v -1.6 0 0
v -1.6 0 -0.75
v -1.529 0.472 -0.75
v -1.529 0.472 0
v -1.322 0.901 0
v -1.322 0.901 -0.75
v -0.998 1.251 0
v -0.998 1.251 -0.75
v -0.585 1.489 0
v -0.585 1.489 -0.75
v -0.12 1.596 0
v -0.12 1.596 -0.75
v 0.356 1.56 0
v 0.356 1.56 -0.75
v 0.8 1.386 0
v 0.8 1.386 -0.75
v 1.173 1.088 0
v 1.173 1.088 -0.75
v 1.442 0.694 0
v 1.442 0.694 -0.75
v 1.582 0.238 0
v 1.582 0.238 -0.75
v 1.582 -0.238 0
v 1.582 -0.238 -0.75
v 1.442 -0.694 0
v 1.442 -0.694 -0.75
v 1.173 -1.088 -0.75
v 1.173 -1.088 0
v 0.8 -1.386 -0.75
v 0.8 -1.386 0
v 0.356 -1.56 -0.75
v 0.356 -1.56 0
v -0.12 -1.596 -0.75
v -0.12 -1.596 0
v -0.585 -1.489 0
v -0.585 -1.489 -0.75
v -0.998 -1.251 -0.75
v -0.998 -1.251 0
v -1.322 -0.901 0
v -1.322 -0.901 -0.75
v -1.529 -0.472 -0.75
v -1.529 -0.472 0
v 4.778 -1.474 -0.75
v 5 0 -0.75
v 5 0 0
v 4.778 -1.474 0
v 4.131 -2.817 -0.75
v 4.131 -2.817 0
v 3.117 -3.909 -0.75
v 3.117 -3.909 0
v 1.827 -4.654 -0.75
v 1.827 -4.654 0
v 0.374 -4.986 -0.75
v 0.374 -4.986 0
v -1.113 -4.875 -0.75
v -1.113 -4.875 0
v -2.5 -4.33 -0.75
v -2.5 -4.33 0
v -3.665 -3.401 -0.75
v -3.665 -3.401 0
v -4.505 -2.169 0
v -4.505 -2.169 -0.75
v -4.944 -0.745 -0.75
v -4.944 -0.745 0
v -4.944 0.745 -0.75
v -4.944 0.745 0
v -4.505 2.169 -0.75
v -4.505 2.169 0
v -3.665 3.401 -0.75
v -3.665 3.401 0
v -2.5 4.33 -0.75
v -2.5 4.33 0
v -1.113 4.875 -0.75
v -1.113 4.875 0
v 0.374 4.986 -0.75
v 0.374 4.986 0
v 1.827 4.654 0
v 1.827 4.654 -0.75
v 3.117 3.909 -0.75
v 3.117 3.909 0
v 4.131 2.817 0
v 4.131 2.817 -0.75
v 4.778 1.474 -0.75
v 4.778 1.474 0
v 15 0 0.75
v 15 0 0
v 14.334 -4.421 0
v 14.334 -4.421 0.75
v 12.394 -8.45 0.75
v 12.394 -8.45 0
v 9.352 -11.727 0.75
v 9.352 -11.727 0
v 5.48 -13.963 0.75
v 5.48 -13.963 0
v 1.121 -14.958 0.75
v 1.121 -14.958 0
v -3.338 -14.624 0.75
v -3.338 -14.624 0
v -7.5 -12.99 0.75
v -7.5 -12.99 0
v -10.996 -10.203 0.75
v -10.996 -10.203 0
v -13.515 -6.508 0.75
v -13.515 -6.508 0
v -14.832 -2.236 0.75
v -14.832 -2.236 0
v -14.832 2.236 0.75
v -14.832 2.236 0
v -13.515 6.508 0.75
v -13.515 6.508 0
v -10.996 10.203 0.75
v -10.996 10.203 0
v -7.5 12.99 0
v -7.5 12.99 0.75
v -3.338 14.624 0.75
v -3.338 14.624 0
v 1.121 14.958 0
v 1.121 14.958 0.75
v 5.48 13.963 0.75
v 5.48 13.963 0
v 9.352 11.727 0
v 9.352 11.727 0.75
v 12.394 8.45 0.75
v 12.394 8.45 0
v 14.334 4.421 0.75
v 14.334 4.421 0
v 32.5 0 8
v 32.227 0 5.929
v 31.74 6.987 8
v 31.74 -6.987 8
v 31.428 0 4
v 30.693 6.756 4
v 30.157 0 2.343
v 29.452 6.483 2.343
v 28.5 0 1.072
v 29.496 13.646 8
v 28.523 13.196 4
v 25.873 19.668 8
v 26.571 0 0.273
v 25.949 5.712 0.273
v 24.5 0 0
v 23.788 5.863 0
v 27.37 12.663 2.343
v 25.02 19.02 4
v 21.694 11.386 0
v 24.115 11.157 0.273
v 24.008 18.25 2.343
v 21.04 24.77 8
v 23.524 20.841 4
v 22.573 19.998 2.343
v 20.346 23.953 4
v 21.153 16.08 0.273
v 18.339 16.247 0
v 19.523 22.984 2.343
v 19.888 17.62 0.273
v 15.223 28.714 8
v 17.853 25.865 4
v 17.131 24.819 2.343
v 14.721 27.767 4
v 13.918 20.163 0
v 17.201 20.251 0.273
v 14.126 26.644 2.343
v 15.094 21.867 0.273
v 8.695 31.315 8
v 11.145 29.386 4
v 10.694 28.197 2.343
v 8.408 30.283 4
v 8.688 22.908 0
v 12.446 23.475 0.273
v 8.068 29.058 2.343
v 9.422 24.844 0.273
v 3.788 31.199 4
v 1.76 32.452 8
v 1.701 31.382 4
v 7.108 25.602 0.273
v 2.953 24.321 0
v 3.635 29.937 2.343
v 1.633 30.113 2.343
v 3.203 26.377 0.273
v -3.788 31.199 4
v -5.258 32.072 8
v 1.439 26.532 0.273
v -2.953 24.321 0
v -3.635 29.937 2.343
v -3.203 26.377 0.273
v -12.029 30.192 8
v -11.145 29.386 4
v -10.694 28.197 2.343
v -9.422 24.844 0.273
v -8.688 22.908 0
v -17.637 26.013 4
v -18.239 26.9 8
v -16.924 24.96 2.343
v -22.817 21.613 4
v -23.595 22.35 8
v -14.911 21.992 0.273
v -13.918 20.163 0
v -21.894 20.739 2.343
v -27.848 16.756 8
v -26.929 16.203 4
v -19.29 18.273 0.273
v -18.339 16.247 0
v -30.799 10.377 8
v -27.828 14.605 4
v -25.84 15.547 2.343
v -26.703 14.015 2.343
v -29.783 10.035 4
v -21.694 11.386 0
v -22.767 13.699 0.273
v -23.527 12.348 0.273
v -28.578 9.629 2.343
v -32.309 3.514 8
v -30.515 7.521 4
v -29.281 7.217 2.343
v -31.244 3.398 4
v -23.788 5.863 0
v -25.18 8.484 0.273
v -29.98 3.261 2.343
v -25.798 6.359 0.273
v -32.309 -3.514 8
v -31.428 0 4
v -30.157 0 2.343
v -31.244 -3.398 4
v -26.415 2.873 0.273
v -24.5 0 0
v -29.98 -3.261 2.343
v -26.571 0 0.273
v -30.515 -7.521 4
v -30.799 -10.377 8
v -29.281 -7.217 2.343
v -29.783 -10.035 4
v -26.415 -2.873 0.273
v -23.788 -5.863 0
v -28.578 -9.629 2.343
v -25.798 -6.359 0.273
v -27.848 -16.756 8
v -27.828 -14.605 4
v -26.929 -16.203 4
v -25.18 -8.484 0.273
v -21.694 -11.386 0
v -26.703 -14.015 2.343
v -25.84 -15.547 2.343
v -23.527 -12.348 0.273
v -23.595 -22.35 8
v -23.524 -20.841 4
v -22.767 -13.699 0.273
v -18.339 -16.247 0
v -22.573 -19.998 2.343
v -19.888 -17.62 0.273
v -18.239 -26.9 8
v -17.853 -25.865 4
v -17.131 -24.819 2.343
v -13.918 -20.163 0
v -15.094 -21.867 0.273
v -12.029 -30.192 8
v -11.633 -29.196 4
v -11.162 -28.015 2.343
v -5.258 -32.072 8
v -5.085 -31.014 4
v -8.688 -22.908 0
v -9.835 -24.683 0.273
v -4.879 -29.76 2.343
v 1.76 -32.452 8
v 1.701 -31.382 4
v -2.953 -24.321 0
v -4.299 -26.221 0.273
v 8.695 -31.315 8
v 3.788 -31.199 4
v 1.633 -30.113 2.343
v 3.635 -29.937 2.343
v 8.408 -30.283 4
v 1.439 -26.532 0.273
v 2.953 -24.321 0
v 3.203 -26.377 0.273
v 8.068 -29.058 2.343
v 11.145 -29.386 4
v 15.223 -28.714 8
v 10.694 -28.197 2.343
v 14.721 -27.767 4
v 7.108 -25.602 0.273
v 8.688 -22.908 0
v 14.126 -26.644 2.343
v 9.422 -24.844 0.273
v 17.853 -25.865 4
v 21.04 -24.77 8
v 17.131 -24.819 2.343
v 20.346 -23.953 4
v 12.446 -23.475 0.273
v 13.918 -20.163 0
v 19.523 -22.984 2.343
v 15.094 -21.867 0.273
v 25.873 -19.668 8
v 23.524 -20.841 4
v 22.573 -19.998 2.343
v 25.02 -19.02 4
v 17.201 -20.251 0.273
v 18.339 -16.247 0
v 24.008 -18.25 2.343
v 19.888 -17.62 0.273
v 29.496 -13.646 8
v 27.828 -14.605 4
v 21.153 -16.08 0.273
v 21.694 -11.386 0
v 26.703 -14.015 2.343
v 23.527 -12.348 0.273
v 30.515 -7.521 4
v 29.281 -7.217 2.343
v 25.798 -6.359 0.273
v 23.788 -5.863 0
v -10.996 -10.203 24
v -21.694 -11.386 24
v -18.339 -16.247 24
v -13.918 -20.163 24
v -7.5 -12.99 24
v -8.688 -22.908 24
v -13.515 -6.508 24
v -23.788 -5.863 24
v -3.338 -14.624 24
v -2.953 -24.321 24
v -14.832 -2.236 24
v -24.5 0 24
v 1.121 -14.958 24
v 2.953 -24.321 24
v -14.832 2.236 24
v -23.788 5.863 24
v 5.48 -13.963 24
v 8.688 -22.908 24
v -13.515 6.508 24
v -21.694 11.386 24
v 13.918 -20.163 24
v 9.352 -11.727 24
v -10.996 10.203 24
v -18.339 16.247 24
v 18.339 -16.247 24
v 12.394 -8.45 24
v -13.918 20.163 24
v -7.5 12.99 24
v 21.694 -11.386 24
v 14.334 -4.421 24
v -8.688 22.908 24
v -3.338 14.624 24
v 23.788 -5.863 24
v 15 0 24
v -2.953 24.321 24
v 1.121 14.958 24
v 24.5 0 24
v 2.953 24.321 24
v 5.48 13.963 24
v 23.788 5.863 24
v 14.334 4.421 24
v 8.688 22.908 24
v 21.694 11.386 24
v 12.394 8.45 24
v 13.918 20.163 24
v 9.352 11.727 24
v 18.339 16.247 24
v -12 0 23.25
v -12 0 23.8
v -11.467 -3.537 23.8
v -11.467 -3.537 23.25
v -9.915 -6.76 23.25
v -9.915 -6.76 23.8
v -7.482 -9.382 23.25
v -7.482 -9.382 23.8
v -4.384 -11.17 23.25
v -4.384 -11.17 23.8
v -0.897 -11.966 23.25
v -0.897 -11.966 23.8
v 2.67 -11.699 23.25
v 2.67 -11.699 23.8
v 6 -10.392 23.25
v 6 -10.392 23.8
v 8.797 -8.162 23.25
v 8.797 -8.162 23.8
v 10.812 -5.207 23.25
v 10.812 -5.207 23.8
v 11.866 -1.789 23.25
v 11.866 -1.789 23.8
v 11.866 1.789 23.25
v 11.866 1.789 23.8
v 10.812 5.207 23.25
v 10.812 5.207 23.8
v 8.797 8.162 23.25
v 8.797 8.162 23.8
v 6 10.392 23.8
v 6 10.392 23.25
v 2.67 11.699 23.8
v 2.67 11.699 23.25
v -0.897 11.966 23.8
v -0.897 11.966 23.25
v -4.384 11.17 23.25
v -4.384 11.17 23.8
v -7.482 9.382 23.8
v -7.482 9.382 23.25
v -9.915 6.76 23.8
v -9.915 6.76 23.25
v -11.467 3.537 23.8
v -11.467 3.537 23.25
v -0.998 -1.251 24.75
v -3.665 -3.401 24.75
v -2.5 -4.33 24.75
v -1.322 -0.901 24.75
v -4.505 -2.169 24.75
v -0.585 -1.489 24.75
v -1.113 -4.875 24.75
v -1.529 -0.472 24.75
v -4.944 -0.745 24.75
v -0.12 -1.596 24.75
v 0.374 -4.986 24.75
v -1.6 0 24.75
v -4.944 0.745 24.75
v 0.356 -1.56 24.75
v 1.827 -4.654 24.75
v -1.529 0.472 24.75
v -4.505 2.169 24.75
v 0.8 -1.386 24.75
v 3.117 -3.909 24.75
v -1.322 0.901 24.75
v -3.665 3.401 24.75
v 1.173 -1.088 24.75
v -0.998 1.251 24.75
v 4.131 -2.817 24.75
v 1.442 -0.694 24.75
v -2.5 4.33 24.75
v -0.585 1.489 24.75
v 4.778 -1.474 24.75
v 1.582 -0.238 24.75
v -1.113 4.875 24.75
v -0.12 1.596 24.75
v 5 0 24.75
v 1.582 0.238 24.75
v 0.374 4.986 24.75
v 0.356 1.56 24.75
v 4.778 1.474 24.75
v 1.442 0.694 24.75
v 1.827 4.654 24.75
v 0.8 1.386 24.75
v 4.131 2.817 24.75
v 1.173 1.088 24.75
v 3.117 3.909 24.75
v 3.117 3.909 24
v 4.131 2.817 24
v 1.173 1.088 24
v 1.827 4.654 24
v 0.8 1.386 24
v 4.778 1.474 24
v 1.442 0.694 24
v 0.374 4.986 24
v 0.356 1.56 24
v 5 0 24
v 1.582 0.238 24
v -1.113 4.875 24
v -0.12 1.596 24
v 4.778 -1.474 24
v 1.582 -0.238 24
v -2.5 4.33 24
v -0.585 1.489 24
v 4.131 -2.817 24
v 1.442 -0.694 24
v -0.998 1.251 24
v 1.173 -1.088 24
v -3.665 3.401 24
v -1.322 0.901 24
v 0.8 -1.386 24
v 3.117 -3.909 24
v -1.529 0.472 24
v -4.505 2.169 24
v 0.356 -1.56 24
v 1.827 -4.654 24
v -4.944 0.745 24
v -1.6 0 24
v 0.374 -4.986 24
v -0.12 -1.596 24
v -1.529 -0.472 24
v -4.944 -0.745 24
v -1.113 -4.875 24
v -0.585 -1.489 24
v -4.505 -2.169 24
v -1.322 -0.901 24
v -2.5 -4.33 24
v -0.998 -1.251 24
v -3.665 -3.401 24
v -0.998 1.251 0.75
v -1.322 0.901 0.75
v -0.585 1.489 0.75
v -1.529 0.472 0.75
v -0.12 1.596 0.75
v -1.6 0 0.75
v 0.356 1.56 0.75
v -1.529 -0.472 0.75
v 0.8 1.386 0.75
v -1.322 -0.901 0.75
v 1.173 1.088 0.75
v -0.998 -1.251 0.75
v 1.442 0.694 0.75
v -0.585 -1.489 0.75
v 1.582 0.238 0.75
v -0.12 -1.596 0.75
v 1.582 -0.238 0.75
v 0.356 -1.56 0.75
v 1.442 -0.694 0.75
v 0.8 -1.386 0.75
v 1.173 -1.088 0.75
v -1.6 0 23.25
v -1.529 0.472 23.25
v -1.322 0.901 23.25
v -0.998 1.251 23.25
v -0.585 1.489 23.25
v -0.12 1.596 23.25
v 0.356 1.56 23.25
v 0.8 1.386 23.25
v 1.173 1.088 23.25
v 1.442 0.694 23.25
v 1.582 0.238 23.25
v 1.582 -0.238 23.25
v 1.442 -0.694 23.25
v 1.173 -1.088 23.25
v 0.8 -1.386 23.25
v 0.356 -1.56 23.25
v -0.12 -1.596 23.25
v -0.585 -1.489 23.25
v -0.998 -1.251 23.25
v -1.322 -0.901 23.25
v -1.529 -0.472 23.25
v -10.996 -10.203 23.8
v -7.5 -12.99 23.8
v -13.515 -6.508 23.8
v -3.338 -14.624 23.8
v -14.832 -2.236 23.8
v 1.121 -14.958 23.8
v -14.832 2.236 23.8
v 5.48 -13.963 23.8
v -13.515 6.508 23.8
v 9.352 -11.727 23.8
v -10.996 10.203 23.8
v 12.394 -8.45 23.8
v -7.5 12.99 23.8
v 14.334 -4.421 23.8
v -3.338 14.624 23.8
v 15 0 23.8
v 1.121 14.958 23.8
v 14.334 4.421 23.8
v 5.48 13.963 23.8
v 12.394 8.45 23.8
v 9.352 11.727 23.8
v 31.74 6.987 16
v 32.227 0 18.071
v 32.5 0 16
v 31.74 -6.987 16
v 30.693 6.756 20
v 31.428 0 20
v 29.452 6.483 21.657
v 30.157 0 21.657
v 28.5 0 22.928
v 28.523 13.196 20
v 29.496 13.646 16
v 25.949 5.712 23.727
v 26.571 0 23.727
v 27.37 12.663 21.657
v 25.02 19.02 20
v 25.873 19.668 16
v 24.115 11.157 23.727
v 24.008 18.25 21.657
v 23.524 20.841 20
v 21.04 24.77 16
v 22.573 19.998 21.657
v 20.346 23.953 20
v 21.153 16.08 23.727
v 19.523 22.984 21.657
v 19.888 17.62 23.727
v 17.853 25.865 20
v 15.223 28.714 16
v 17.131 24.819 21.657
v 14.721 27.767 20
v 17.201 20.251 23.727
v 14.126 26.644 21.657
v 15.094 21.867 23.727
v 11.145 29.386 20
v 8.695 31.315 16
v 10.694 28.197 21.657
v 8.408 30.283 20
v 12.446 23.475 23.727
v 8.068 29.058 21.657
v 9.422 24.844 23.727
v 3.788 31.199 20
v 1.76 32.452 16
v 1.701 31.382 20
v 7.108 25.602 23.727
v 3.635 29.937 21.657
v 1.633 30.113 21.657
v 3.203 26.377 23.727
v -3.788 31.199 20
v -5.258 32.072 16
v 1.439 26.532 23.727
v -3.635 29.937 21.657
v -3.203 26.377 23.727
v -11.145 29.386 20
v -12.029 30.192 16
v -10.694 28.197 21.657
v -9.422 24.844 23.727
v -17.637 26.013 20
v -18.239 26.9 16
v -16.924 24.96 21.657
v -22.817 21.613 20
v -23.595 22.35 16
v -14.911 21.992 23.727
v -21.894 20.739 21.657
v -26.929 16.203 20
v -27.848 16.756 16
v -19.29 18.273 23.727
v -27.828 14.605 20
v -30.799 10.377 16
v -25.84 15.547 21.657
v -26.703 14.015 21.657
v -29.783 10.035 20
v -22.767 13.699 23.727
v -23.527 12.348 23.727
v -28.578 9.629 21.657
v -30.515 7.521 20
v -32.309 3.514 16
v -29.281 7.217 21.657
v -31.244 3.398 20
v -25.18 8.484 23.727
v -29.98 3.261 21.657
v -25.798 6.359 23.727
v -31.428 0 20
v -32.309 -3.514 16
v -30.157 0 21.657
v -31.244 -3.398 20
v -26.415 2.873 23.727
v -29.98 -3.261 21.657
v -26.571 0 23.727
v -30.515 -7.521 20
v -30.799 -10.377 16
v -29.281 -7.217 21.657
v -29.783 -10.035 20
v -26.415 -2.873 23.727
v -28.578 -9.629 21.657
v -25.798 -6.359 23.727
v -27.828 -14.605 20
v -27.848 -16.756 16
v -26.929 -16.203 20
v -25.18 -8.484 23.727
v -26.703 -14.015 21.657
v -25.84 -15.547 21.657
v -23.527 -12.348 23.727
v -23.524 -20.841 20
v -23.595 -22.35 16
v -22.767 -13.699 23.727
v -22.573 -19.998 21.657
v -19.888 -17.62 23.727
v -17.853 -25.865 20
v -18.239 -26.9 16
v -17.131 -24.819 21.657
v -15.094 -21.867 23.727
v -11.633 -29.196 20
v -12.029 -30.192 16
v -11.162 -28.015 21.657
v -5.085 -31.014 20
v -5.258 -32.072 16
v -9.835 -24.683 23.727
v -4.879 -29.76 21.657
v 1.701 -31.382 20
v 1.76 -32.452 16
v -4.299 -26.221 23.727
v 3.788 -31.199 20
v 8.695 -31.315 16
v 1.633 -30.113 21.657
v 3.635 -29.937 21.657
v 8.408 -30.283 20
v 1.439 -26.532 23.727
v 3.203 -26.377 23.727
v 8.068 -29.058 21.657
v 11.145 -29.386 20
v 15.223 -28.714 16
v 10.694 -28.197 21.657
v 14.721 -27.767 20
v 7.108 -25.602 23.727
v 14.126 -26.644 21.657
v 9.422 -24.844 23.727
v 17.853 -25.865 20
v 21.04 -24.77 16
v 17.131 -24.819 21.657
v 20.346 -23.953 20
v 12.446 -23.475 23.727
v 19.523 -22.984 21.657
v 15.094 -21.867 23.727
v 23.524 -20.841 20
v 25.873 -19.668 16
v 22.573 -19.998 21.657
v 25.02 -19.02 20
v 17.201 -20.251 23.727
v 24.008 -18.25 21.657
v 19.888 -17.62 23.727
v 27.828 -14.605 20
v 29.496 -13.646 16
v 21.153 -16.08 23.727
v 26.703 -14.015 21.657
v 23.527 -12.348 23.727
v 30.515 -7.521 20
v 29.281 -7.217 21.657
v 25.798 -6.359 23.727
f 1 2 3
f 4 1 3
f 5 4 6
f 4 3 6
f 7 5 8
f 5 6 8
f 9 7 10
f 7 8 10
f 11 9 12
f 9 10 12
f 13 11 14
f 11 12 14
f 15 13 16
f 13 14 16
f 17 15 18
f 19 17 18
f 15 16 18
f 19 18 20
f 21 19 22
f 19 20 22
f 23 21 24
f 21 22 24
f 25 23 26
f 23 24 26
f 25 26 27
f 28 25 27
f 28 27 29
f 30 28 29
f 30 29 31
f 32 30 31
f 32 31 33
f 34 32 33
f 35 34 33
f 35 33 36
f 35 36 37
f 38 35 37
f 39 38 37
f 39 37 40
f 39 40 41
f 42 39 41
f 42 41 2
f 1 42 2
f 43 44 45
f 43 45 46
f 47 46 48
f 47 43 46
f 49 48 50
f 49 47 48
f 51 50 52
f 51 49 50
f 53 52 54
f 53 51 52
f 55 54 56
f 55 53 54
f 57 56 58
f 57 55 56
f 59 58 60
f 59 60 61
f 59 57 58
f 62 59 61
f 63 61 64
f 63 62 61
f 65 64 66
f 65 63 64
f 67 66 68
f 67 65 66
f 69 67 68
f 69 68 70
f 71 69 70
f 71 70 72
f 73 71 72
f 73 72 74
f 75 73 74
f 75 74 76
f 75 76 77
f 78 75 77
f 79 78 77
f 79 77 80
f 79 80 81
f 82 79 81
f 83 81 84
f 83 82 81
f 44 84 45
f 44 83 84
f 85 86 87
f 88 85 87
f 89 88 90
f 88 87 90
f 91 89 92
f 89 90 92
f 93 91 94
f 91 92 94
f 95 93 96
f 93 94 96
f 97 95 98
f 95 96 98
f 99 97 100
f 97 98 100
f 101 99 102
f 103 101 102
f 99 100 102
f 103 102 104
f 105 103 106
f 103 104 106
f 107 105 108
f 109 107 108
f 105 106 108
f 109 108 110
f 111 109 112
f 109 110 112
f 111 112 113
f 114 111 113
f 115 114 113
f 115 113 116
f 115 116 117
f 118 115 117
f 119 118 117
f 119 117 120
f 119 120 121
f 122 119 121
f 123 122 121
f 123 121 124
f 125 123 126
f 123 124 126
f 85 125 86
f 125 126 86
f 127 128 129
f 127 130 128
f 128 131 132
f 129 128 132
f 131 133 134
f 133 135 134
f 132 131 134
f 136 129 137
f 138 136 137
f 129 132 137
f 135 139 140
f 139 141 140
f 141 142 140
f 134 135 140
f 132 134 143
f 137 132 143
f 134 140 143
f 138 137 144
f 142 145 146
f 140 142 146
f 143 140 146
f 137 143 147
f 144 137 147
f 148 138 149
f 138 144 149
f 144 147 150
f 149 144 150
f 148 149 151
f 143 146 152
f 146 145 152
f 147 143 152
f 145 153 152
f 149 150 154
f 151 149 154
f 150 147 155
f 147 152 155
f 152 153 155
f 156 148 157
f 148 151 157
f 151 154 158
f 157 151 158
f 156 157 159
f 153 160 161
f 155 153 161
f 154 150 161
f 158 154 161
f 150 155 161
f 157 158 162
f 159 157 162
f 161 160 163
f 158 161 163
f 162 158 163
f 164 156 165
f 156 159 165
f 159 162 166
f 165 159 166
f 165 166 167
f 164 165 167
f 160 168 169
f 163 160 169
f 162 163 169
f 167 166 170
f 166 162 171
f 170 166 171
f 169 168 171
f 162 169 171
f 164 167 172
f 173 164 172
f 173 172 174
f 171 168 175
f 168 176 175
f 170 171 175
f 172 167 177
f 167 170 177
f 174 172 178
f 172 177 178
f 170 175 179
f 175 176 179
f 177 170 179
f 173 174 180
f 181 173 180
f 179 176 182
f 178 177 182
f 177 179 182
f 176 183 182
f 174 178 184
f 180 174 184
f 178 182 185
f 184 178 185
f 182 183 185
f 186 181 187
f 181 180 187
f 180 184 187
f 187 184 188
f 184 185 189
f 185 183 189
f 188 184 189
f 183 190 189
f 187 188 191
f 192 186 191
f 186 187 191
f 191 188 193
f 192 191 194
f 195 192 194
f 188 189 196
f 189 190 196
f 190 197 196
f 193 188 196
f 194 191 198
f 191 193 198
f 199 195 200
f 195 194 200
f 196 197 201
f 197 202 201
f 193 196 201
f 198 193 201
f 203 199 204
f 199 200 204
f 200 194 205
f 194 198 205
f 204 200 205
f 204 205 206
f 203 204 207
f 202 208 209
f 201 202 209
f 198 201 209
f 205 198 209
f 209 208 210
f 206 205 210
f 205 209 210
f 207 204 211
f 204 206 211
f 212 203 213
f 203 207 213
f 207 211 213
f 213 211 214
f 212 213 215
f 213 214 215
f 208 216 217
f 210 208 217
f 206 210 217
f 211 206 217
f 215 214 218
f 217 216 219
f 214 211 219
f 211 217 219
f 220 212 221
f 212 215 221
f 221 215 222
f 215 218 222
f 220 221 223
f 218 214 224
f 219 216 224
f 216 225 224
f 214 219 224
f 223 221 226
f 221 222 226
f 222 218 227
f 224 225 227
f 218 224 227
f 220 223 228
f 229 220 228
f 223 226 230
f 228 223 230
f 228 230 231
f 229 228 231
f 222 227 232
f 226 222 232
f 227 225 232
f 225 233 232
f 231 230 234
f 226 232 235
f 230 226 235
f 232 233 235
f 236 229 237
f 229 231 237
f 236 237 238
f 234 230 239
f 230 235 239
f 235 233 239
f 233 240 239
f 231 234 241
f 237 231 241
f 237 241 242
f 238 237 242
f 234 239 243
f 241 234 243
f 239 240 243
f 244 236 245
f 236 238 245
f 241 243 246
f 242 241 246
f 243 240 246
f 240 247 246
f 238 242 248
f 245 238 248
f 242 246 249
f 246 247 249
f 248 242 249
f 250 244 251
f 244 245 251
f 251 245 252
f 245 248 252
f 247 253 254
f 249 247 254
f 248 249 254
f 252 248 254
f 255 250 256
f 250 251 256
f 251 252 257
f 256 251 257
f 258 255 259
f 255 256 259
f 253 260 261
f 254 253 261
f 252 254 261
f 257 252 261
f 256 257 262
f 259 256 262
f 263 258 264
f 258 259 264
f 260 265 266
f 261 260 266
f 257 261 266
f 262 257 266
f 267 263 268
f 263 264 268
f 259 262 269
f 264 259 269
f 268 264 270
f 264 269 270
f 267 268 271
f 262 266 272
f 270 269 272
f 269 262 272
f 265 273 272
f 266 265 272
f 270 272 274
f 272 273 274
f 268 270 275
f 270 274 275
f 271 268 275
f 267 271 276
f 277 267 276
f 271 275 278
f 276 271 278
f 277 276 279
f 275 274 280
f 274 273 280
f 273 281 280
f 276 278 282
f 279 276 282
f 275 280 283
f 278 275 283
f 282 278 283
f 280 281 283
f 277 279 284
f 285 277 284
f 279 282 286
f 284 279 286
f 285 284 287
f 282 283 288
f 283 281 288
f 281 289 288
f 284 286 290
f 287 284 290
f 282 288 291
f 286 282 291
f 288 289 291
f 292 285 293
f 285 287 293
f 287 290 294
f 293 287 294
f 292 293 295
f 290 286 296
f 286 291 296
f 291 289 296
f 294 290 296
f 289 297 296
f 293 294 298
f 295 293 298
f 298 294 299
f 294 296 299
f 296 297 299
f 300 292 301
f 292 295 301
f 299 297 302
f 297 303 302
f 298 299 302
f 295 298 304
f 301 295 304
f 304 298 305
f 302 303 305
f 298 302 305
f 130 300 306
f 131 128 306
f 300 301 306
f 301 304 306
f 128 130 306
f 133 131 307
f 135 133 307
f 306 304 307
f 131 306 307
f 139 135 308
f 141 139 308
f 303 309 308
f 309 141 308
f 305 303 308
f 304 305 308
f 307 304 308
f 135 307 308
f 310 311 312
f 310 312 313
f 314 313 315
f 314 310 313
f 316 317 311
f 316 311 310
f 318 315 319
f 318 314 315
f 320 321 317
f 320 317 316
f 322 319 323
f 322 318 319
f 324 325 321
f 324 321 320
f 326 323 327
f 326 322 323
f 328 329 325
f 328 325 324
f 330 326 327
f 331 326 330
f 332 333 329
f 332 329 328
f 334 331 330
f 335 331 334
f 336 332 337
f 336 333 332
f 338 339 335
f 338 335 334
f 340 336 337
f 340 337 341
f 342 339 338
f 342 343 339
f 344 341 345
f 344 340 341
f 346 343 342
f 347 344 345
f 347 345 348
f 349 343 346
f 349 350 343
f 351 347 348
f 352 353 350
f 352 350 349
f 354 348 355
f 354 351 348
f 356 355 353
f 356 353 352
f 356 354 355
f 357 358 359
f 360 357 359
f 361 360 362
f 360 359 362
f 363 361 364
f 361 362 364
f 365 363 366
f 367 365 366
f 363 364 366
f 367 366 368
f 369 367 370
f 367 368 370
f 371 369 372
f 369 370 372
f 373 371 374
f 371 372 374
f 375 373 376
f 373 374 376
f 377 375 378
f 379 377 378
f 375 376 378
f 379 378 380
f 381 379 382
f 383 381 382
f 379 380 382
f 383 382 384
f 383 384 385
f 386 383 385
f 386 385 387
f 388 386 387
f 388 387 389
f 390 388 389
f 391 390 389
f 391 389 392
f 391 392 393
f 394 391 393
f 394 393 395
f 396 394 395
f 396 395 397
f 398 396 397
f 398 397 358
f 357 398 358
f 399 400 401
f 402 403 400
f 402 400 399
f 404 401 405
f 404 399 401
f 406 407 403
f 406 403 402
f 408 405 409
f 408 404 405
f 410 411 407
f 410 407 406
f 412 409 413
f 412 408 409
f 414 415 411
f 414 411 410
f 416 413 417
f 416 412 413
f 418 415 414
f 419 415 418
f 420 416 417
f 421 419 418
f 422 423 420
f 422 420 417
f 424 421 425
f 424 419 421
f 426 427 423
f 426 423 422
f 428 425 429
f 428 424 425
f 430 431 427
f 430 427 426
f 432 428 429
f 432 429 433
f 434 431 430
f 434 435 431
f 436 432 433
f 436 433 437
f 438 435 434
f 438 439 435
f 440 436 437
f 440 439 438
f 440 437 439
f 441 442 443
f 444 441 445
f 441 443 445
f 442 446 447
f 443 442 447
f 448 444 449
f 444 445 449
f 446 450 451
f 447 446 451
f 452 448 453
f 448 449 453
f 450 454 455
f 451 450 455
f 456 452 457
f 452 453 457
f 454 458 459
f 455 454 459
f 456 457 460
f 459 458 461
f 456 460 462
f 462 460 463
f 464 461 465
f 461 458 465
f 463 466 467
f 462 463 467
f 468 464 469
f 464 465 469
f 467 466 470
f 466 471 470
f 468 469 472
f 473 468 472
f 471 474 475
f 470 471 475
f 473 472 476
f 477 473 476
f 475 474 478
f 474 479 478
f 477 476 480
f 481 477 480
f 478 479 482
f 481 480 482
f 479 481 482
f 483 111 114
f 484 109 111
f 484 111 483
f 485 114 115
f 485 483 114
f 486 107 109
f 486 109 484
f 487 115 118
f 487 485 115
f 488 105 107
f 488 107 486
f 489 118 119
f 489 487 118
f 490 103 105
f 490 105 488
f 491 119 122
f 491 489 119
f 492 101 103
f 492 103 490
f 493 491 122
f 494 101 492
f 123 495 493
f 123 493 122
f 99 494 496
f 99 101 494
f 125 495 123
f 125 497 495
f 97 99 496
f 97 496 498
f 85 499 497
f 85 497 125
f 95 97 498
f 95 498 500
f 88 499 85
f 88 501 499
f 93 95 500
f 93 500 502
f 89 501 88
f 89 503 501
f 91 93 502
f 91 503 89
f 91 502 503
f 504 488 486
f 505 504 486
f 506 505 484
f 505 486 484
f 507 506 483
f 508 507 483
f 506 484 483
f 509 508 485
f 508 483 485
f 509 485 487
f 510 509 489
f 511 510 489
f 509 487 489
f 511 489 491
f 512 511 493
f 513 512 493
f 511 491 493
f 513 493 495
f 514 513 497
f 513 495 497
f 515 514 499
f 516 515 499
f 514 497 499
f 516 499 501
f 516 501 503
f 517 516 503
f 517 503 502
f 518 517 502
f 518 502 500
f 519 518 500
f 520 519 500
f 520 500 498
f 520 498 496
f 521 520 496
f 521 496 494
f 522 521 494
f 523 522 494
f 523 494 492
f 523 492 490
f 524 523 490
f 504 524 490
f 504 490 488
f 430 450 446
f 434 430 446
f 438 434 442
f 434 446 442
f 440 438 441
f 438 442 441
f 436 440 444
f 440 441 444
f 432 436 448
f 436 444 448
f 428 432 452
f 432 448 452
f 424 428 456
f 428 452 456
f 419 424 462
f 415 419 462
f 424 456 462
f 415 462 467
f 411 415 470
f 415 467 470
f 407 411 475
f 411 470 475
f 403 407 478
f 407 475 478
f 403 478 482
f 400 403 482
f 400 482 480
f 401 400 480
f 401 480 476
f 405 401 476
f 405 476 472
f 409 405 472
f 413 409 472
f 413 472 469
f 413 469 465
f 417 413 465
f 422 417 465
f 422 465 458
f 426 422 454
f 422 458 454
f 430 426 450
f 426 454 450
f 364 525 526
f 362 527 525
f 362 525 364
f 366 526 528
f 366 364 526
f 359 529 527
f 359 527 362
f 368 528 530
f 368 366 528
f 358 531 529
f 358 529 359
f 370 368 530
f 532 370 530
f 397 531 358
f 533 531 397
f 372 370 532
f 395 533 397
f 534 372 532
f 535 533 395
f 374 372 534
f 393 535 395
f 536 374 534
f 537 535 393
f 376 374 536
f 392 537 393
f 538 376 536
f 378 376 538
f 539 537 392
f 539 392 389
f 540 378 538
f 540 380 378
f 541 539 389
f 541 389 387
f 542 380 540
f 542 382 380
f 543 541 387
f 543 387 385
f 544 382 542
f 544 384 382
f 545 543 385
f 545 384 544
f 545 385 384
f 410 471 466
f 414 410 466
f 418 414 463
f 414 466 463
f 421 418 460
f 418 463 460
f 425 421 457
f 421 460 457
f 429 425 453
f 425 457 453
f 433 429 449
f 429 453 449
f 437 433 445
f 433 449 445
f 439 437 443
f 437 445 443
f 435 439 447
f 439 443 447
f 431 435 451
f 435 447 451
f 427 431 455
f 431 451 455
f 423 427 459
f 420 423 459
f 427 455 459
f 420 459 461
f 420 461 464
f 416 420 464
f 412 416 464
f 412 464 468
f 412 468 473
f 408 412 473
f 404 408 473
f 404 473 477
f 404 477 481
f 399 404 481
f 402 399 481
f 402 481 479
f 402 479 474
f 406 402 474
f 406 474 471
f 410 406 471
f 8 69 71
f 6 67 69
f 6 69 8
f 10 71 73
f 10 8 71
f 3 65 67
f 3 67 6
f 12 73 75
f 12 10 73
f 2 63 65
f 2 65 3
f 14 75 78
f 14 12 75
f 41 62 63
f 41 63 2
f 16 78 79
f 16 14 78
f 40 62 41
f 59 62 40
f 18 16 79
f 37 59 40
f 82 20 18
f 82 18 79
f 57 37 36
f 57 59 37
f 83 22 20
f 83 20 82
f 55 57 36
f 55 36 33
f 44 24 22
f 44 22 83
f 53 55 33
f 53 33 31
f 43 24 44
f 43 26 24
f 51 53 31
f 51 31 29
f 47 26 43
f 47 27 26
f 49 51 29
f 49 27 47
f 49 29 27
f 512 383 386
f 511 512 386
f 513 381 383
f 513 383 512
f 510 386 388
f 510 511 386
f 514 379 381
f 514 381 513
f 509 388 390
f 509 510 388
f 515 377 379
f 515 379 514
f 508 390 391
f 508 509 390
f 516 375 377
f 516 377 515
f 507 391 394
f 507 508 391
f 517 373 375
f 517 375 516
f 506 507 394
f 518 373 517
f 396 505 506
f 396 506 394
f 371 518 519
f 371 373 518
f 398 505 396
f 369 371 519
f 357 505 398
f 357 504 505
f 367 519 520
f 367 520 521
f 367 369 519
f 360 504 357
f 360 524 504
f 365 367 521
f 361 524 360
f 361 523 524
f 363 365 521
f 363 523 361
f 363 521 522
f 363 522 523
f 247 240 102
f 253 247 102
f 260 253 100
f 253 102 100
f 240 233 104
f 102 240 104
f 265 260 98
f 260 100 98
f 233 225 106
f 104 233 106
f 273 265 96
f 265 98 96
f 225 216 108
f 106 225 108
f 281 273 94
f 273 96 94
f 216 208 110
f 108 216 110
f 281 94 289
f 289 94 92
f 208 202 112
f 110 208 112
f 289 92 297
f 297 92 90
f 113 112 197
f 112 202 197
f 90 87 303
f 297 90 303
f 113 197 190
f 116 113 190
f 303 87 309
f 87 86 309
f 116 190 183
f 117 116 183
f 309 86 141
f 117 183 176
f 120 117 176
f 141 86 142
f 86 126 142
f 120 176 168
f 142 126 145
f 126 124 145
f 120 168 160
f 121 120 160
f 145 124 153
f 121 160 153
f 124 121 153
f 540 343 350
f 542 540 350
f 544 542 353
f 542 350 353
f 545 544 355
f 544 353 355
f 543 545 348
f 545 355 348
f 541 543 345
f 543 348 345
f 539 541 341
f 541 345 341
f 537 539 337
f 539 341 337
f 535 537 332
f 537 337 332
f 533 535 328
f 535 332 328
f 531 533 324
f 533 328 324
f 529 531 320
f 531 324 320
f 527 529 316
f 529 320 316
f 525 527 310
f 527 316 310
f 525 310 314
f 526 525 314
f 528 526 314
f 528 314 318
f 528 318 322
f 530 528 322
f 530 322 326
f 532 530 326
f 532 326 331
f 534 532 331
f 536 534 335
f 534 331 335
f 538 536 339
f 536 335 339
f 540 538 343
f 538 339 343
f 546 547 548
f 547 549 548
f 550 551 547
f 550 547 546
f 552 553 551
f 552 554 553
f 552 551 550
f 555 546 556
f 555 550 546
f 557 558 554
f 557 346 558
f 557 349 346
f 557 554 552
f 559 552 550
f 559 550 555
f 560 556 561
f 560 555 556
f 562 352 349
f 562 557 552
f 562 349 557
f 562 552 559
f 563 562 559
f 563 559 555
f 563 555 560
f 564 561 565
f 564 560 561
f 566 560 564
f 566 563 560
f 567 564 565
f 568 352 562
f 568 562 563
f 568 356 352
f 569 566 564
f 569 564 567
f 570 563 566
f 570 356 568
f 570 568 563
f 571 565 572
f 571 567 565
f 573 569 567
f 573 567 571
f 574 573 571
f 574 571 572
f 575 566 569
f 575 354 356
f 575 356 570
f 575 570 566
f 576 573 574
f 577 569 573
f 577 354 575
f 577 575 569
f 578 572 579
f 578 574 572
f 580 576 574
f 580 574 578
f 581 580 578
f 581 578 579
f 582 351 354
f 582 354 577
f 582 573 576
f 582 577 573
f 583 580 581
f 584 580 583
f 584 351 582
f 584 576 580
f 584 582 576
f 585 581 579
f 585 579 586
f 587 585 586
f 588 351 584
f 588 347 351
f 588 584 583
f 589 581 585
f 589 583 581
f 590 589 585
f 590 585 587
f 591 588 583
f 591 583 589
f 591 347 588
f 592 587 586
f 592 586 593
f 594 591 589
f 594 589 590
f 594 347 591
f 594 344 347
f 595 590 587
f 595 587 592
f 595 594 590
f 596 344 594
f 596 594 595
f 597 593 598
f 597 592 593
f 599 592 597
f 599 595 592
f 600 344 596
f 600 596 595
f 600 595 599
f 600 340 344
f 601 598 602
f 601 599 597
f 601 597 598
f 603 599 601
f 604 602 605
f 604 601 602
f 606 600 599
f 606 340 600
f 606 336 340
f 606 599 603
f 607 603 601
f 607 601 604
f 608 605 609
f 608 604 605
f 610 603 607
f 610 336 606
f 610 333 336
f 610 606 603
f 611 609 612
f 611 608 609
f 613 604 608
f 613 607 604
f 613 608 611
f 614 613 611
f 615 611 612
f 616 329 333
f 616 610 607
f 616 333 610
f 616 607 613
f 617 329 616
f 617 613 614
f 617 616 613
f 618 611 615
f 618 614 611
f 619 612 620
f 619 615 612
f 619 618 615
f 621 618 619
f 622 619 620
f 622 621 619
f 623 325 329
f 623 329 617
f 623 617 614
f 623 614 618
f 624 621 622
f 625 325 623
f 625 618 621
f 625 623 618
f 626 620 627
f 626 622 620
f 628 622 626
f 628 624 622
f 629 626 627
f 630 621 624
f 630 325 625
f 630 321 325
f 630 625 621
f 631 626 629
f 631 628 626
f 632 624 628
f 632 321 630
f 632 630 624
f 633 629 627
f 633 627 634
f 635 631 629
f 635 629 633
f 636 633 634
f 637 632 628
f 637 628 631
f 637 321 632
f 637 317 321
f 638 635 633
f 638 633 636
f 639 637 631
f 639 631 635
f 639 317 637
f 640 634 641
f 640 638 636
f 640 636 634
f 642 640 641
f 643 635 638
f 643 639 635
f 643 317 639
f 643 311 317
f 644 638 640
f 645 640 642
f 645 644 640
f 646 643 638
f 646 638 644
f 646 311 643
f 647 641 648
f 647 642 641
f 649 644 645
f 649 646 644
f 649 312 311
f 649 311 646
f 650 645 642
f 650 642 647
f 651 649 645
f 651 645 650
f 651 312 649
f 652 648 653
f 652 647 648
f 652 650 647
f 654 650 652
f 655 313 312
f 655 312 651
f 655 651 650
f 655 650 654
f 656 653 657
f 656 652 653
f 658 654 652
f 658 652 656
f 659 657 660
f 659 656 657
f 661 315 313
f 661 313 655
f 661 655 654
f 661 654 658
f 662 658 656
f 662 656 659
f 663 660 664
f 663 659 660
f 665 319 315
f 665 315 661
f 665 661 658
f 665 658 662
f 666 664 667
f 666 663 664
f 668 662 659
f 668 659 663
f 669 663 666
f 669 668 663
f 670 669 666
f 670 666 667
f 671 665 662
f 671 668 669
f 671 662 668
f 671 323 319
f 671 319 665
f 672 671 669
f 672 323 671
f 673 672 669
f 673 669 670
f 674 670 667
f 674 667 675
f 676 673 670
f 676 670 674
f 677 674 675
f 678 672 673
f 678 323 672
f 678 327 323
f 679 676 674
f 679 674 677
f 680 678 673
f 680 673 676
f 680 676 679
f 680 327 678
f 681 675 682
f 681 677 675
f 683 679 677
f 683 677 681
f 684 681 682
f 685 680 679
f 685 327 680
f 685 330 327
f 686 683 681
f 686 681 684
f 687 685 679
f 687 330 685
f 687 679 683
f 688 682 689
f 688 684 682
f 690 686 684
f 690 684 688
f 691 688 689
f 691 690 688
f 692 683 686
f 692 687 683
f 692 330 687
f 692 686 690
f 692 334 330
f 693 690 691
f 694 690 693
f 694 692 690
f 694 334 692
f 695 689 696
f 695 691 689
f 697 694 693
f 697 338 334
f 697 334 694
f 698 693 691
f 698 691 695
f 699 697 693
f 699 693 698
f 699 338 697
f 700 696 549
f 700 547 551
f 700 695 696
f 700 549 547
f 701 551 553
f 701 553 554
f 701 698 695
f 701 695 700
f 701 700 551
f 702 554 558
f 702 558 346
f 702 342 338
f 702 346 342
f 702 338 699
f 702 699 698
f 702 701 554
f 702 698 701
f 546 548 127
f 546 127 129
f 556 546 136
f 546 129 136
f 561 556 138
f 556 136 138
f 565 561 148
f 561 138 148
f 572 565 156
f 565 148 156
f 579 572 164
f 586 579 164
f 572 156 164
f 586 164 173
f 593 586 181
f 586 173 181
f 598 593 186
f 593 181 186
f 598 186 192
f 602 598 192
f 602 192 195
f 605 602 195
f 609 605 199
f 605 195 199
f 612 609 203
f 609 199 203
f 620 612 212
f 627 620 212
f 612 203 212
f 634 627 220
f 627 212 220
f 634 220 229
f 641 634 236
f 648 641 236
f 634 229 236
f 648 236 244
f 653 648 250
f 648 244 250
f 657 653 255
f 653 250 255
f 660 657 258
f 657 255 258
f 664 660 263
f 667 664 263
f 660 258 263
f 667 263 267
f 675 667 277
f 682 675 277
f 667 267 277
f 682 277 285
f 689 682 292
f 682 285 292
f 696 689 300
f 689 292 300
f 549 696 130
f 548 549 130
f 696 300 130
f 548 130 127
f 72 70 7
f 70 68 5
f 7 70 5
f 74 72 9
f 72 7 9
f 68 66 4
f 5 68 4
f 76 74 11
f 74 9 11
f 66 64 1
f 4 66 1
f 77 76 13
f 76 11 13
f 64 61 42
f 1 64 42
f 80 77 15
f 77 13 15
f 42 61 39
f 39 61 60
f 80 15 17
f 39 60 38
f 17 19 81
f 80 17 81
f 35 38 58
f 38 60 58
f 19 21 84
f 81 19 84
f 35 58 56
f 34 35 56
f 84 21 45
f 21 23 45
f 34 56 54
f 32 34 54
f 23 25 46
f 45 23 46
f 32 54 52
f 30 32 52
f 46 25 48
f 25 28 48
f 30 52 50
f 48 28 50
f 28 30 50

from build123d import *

# Parameters (mm, degrees)
SKETCH1_R           = 32.5
SKETCH1_R_2         = 1.6
BOSS_EXTRUDE1_DEPTH = 24
FILLET2_R           = 8
SKETCH3_R           = 5
BOSS_EXTRUDE2_DEPTH = 0.75
BOSS_EXTRUDE3_START = 0.75
SKETCH4_R           = 5
BOSS_EXTRUDE3_DEPTH = 0.75
SKETCH5_R           = 1.6
CUT_EXTRUDE1_DEPTH  = 40.75
SKETCH6_R           = 15
SKETCH6_R_2         = 12
CUT_EXTRUDE3_DEPTH  = 0.2
CUT_EXTRUDE5_START  = -0.75
SKETCH9_R           = 12
CUT_EXTRUDE5_DEPTH  = 0.75
SKETCH11_R          = 12
CUT_EXTRUDE6_DEPTH  = 0.75
SKETCH12_R          = 15
SKETCH12_R_2        = 12
CUT_EXTRUDE7_DEPTH  = 0.75


with BuildPart() as part:
    # Sketch1 → Boss-Extrude1 (new body)
    with BuildSketch(Plane.XY):
        Circle(SKETCH1_R)
        Circle(SKETCH1_R_2, mode=Mode.SUBTRACT)
    extrude(amount=BOSS_EXTRUDE1_DEPTH)

    # Fillet2
    fillet2_edges = [part.edges().sort_by_distance(p)[0] for p in [
        (-32.5, 0, 0),
        (-32.5, 0, 24),
    ]]
    fillet(fillet2_edges, radius=FILLET2_R)

    # Sketch3 → Boss-Extrude2 (add)
    with BuildSketch(Plane.XY.offset(24)):
        Circle(SKETCH3_R)
    extrude(amount=BOSS_EXTRUDE2_DEPTH)

    # Sketch4 → Boss-Extrude3 (add)
    with BuildSketch(Plane(origin=(0, 0, 0), x_dir=(-1, 0, 0), z_dir=(0, 0, -1)).offset(BOSS_EXTRUDE3_START)):
        with Locations(Location((0, 0, 0), (0, 0, 180))):
            Circle(SKETCH4_R)
    extrude(amount=-BOSS_EXTRUDE3_DEPTH)

    # Sketch5 → Cut-Extrude1 (cut)
    with BuildSketch(Plane(origin=(0, 0, -0.75), x_dir=(-1, 0, 0), z_dir=(0, 0, -1))):
        Circle(SKETCH5_R)
    extrude(amount=-CUT_EXTRUDE1_DEPTH, mode=Mode.SUBTRACT)

    # Sketch6 → Cut-Extrude3 (cut)
    with BuildSketch(Plane.XY.offset(24)):
        Circle(SKETCH6_R)
        Circle(SKETCH6_R_2, mode=Mode.SUBTRACT)
    extrude(amount=-CUT_EXTRUDE3_DEPTH, mode=Mode.SUBTRACT)

    # Sketch9 → Cut-Extrude5 (cut)
    with BuildSketch(Plane(origin=(0, 0, 0), x_dir=(-1, 0, 0), z_dir=(0, 0, -1)).offset(CUT_EXTRUDE5_START)):
        with Locations(Location((0, 0, 0), (0, 0, 180))):
            Circle(SKETCH9_R)
    extrude(amount=CUT_EXTRUDE5_DEPTH, mode=Mode.SUBTRACT)


with BuildPart() as cut_extrude5_piece_1:
    # of the separate pieces the step leaves, piece 1, a body of its own (cut_extrude5_pieces)
    add(part.part.solids().sort_by_distance((32.5, 0, 8))[0])

    # Sketch11 → Cut-Extrude6 (cut)
    with BuildSketch(Plane.XY.offset(24)):
        with Locations(Location((0, 0, 0), (0, 0, 180))):
            Circle(SKETCH11_R)
    extrude(amount=-CUT_EXTRUDE6_DEPTH, mode=Mode.SUBTRACT)


with BuildPart() as cut_extrude5_piece_2:
    # of the separate pieces the step leaves, piece 2, a body of its own (cut_extrude5_pieces)
    add(part.part.solids().sort_by_distance((5, 0, -0.75))[0])


with BuildPart() as cut_extrude6_piece_1:
    # of the separate pieces the step leaves, piece 1, a body of its own (cut_extrude6_pieces)
    add(cut_extrude5_piece_1.part.solids().sort_by_distance((32.5, 0, 8))[0])

    # Sketch12 → Cut-Extrude7 (cut)
    with BuildSketch(Plane(origin=(0, 0, 0), x_dir=(-1, 0, 0), z_dir=(0, 0, -1))):
        with Locations(Location((0, 0, 0), (0, 0, 180))):
            Circle(SKETCH12_R)
        with Locations(Location((0, 0, 0), (0, 0, 180))):
            Circle(SKETCH12_R_2, mode=Mode.SUBTRACT)
    extrude(amount=-CUT_EXTRUDE7_DEPTH, mode=Mode.SUBTRACT)


with BuildPart() as cut_extrude6_piece_2:
    # of the separate pieces the step leaves, piece 2, a body of its own (cut_extrude6_pieces)
    add(cut_extrude5_piece_1.part.solids().sort_by_distance((-1.6, 0, 24))[0])


solid = Compound([cut_extrude5_piece_2.part, cut_extrude6_piece_1.part, cut_extrude6_piece_2.part])
